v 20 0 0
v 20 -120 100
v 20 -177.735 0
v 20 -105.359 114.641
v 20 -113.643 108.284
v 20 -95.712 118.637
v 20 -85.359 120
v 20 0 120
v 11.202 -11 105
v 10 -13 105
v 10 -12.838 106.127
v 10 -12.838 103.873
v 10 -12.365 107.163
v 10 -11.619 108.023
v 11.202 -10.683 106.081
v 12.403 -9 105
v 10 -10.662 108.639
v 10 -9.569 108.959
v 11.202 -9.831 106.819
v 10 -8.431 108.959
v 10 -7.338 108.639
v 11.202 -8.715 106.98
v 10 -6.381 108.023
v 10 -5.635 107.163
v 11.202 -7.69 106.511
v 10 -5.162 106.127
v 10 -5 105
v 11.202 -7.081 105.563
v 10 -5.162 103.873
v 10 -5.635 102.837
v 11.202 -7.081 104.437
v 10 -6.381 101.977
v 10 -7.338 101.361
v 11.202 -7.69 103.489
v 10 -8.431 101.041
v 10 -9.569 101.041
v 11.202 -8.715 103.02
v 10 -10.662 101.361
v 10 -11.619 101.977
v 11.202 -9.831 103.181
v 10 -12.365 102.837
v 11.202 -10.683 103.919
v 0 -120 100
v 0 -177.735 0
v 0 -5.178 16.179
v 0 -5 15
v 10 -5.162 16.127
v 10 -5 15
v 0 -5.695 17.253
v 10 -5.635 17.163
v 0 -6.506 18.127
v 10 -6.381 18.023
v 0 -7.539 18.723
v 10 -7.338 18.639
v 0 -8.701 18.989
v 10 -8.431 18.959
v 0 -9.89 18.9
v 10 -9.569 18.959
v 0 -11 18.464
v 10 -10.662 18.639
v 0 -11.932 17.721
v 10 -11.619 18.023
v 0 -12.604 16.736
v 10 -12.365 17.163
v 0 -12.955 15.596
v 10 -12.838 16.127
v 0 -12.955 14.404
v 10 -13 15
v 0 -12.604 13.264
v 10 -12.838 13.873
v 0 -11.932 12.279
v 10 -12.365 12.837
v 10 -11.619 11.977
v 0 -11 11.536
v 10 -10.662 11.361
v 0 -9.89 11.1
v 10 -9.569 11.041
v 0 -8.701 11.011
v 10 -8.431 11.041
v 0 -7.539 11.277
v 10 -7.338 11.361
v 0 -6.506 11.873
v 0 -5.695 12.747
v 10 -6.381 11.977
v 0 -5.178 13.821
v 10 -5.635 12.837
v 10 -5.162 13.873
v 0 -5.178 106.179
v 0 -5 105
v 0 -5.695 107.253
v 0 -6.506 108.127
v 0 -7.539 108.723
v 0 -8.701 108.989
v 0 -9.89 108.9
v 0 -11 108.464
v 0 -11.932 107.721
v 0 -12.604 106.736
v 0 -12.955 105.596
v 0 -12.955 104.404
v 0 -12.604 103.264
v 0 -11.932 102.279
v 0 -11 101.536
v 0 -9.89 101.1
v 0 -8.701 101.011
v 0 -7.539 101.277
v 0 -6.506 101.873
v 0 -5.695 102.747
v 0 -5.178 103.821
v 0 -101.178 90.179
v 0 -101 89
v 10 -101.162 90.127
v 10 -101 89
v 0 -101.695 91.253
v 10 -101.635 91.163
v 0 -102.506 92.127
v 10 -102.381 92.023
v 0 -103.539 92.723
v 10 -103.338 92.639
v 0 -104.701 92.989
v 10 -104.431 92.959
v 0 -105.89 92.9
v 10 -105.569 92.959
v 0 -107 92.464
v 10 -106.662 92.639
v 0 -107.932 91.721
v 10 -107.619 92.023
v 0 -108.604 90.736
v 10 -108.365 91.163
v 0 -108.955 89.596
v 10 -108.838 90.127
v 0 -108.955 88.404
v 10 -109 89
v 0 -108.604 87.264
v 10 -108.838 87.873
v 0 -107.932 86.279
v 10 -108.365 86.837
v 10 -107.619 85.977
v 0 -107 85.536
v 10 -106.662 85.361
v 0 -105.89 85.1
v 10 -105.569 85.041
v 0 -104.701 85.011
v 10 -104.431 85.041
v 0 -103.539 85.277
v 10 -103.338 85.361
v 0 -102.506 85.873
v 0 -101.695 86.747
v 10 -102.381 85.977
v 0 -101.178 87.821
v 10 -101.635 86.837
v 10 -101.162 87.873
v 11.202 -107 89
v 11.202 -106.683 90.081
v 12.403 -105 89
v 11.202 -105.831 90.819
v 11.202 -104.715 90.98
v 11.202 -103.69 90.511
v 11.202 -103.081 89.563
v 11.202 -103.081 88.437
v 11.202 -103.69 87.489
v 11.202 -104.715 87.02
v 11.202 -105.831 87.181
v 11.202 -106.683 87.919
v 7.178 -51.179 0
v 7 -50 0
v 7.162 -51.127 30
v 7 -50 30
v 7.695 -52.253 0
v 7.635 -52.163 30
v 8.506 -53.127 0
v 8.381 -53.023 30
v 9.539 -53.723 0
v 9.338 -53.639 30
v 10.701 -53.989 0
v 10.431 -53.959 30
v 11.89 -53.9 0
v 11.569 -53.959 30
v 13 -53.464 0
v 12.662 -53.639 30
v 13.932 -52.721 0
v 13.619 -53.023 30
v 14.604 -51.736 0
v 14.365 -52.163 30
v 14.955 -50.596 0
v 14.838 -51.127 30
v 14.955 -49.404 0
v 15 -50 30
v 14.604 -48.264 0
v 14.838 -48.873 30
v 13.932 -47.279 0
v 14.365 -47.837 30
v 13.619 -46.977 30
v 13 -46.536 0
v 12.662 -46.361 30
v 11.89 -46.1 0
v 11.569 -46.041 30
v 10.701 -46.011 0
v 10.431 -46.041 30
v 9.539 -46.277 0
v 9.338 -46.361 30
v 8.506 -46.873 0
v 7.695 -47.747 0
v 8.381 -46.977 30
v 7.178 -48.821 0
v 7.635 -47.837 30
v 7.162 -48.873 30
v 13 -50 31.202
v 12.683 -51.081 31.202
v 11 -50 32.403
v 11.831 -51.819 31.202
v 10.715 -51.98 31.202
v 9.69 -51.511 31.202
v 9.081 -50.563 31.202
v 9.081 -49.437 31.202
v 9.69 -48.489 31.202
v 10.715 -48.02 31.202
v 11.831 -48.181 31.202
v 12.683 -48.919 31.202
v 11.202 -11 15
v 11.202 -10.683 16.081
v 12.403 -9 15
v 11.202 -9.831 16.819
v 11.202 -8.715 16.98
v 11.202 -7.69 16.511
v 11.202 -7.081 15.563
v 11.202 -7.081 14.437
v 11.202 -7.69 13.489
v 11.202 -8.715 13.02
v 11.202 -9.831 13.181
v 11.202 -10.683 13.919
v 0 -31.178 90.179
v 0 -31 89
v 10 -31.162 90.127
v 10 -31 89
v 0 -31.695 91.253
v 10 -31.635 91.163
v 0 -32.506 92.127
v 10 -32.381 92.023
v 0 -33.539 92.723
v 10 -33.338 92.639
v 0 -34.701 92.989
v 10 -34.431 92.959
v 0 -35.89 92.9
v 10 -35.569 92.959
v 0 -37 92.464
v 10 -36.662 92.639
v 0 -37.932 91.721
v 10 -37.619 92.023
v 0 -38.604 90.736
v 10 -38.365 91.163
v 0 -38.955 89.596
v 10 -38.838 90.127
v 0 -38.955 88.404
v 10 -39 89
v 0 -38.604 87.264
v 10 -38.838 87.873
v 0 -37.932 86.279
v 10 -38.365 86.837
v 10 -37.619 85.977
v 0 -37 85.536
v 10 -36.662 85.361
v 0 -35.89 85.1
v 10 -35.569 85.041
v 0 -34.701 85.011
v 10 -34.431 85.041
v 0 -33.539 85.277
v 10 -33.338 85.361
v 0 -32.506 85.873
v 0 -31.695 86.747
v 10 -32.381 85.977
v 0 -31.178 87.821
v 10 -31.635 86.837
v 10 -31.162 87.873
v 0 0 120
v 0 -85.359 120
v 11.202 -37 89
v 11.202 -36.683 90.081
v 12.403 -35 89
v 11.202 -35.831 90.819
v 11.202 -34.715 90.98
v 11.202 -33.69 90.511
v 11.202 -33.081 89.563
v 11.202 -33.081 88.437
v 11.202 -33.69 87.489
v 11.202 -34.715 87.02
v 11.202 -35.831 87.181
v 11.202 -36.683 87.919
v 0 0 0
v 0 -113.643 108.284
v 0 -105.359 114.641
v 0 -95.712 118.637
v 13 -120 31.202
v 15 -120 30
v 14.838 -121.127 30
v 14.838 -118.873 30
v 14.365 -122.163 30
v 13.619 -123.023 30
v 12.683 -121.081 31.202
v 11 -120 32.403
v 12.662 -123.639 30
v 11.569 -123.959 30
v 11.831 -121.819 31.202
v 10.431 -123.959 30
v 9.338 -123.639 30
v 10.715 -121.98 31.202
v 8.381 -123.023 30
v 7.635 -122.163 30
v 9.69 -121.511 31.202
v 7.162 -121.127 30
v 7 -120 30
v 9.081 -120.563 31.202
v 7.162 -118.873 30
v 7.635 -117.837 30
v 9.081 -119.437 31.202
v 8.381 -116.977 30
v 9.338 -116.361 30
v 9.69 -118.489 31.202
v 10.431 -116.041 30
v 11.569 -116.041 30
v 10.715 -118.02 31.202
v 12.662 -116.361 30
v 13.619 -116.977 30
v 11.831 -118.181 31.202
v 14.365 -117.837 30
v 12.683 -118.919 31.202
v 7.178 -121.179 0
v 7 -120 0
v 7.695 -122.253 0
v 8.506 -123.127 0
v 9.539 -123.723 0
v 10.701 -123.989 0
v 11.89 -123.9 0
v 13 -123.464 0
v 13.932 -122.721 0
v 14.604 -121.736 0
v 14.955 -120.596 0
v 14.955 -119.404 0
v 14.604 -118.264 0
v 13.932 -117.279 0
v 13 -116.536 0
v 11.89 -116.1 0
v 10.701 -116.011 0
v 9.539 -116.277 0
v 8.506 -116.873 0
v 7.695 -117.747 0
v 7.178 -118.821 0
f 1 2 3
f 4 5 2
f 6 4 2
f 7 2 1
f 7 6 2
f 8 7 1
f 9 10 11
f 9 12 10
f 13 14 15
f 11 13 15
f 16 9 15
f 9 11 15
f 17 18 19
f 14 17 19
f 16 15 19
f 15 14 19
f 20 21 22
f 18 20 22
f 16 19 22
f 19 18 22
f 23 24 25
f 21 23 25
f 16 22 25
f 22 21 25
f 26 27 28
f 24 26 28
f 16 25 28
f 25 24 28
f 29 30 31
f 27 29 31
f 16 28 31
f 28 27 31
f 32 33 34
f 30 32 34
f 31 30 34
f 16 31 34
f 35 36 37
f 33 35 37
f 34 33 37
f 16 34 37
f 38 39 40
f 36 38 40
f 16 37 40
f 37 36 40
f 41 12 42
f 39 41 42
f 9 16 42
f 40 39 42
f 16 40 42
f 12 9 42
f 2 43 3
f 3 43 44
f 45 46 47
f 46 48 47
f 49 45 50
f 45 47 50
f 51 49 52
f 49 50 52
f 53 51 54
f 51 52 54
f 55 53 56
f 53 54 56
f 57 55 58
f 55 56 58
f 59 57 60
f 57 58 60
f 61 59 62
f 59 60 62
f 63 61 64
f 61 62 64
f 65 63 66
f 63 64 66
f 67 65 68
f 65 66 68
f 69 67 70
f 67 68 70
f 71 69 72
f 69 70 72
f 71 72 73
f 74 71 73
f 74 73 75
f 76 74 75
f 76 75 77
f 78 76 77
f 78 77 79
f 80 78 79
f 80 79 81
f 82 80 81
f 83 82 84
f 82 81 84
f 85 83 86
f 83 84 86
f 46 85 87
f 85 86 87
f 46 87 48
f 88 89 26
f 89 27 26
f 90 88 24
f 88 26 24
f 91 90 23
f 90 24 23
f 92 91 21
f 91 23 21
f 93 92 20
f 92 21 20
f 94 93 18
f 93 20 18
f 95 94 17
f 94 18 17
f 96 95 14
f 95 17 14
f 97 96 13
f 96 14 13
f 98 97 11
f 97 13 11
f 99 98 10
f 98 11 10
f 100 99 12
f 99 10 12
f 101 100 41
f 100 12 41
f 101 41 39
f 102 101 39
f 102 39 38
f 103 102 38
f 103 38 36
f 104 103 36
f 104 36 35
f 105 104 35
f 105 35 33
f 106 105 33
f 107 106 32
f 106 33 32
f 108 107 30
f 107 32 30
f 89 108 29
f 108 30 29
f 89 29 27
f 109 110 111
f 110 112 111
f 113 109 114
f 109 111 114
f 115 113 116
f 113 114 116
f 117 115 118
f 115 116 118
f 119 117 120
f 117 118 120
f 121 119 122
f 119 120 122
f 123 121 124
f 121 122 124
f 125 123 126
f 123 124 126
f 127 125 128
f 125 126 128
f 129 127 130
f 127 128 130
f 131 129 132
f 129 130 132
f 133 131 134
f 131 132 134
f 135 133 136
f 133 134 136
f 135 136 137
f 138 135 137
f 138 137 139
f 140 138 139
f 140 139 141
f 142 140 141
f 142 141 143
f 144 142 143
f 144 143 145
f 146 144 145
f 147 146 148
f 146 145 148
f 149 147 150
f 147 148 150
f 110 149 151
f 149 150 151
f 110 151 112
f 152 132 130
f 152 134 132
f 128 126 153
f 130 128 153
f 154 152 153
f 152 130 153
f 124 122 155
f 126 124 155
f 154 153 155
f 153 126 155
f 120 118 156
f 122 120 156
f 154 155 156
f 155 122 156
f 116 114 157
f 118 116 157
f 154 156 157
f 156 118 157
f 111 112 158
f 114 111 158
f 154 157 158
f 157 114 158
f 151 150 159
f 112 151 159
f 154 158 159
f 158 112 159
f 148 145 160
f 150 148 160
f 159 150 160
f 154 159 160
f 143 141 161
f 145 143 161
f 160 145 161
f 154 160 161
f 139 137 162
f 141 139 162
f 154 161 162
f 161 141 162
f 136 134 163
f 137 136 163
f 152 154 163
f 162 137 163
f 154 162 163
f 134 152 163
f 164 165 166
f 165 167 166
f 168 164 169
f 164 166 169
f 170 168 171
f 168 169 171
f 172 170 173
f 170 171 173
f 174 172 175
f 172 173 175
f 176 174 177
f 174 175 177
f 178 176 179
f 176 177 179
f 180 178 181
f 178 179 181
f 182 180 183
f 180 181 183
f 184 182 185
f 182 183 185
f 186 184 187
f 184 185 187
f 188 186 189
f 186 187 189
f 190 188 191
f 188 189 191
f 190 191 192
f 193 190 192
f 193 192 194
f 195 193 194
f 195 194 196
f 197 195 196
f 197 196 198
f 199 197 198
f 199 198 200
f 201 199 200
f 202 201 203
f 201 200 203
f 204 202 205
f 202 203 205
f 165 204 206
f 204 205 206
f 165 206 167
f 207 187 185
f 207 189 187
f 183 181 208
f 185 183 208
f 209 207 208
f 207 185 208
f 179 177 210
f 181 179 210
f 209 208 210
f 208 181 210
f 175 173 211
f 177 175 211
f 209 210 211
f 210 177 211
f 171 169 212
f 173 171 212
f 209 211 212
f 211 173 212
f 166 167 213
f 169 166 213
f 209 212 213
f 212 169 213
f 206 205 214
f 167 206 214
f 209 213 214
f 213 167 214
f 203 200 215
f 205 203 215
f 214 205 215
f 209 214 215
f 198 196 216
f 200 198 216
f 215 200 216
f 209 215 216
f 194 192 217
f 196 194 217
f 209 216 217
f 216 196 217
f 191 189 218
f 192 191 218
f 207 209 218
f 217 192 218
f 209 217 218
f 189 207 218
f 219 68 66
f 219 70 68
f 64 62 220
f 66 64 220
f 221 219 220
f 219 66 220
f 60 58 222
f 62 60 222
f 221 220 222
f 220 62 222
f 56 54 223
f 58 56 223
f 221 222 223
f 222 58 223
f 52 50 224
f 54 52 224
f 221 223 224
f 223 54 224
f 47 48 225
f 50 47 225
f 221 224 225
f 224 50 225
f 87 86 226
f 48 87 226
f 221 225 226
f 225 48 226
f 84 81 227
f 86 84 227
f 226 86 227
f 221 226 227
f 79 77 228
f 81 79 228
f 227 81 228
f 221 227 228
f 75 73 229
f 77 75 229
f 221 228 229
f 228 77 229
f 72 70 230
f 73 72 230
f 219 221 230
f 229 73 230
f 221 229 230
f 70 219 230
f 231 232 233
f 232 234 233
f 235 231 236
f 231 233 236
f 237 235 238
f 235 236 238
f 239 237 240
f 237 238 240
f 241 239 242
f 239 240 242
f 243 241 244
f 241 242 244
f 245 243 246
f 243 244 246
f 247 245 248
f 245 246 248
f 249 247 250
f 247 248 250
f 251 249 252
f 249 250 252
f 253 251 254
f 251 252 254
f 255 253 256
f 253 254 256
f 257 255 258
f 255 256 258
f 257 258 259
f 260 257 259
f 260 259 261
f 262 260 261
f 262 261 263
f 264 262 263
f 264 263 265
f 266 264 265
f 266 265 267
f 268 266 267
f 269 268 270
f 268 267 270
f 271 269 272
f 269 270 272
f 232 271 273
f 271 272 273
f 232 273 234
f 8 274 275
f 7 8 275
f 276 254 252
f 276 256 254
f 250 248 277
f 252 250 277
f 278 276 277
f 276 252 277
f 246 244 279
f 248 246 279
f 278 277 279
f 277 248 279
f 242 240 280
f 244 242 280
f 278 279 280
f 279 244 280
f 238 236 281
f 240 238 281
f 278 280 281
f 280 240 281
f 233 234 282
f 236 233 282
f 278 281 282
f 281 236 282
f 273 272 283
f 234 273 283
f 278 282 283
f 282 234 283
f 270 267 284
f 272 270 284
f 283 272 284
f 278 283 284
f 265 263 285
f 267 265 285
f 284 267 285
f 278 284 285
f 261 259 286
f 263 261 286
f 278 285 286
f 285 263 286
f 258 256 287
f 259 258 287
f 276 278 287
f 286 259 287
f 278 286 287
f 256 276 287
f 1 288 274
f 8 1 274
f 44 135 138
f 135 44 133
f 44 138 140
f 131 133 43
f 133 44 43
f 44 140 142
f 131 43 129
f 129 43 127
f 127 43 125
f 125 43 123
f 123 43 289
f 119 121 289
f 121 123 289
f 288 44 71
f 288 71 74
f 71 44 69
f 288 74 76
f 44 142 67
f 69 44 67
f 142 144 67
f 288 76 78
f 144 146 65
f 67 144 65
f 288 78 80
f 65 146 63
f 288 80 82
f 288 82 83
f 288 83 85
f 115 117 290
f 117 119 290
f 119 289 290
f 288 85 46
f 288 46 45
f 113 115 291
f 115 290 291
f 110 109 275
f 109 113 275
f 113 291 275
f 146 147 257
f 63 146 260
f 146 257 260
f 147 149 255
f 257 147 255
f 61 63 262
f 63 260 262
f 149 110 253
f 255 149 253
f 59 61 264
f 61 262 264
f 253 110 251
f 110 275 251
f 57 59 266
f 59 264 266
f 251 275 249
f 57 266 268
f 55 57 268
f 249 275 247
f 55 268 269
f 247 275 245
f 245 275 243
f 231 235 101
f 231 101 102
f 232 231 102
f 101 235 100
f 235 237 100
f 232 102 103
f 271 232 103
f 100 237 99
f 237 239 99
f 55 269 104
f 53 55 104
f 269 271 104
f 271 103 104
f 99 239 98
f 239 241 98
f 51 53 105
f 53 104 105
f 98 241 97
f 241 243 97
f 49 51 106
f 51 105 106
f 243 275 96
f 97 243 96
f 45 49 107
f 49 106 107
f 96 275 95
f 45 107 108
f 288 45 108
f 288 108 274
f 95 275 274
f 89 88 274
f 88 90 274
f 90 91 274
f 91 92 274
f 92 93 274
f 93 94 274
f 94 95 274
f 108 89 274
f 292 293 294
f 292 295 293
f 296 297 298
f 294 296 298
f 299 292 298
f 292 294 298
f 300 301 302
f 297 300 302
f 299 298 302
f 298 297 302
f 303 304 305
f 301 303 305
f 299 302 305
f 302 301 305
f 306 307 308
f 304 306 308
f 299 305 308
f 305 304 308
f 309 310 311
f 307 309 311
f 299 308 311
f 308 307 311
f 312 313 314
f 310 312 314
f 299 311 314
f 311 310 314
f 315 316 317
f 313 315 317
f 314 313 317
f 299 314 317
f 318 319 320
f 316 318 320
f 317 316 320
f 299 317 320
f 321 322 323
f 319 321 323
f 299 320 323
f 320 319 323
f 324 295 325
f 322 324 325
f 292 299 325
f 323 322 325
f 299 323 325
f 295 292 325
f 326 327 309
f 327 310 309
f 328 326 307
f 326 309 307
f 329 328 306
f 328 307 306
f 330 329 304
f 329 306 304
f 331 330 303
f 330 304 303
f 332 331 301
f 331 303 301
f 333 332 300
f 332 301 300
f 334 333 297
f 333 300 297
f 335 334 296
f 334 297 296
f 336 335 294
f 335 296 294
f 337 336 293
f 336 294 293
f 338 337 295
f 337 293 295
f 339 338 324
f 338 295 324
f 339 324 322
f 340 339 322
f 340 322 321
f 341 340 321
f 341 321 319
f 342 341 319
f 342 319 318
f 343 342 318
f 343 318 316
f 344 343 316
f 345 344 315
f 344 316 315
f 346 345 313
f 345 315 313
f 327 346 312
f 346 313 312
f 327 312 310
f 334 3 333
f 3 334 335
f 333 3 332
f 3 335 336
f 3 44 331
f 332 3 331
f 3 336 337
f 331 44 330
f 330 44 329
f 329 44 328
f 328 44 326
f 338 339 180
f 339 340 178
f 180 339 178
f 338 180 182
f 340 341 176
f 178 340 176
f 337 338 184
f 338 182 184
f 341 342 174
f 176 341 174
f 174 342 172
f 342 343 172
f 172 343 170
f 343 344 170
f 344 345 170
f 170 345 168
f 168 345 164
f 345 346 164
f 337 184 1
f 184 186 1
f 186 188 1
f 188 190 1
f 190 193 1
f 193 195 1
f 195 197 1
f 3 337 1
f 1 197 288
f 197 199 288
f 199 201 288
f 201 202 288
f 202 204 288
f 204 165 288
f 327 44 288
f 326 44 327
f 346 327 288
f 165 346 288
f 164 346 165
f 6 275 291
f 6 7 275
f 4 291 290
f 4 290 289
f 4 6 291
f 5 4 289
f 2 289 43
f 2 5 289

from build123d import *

# Parameters (mm, degrees)
F1_DEPTH = 20
F2_R     = 40
F5_D     = 8
F5_DEPTH = 10
F5_TIP   = 2.4034424761
F6_D     = 8
F6_DEPTH = 30
F6_TIP   = 2.4034424761


with BuildPart() as f1:
    # F0 (on Right) → F1 (new body)
    with BuildSketch(Plane.YZ):
        Polygon((-177.735026919, 0), (0, 0), (0, 100), (-120, 100), align=None)
        Polygon((-120, 100), (0, 100), (0, 120), (-108.4529946162, 120), align=None)
    extrude(amount=F1_DEPTH)

    # F2
    f2_edges = [f1.edges().sort_by_distance(p)[0] for p in [
        (10, -108.452995, 120),
    ]]
    fillet(f2_edges, radius=F2_R)

    # F5
    with Locations(Plane(origin=(0, 0, 0), x_dir=(0, -1, 0), z_dir=(-1, 0, 0))):
        with Locations((35, 89), (105, 89), (9, 15), (9, 105)):
            Hole(F5_D / 2, depth=F5_DEPTH)
            with Locations((0, 0, -(F5_DEPTH + F5_TIP / 2))):  # 118° drill point
                Cone(0, F5_D / 2, F5_TIP, mode=Mode.SUBTRACT)

    # F6
    with Locations(Plane(origin=(0, 0, 0), x_dir=(1, 0, 0), z_dir=(0, 0, -1))):
        with Locations((11, 120), (11, 50)):
            Hole(F6_D / 2, depth=F6_DEPTH)
            with Locations((0, 0, -(F6_DEPTH + F6_TIP / 2))):  # 118° drill point
                Cone(0, F6_D / 2, F6_TIP, mode=Mode.SUBTRACT)


solid = f1.part
